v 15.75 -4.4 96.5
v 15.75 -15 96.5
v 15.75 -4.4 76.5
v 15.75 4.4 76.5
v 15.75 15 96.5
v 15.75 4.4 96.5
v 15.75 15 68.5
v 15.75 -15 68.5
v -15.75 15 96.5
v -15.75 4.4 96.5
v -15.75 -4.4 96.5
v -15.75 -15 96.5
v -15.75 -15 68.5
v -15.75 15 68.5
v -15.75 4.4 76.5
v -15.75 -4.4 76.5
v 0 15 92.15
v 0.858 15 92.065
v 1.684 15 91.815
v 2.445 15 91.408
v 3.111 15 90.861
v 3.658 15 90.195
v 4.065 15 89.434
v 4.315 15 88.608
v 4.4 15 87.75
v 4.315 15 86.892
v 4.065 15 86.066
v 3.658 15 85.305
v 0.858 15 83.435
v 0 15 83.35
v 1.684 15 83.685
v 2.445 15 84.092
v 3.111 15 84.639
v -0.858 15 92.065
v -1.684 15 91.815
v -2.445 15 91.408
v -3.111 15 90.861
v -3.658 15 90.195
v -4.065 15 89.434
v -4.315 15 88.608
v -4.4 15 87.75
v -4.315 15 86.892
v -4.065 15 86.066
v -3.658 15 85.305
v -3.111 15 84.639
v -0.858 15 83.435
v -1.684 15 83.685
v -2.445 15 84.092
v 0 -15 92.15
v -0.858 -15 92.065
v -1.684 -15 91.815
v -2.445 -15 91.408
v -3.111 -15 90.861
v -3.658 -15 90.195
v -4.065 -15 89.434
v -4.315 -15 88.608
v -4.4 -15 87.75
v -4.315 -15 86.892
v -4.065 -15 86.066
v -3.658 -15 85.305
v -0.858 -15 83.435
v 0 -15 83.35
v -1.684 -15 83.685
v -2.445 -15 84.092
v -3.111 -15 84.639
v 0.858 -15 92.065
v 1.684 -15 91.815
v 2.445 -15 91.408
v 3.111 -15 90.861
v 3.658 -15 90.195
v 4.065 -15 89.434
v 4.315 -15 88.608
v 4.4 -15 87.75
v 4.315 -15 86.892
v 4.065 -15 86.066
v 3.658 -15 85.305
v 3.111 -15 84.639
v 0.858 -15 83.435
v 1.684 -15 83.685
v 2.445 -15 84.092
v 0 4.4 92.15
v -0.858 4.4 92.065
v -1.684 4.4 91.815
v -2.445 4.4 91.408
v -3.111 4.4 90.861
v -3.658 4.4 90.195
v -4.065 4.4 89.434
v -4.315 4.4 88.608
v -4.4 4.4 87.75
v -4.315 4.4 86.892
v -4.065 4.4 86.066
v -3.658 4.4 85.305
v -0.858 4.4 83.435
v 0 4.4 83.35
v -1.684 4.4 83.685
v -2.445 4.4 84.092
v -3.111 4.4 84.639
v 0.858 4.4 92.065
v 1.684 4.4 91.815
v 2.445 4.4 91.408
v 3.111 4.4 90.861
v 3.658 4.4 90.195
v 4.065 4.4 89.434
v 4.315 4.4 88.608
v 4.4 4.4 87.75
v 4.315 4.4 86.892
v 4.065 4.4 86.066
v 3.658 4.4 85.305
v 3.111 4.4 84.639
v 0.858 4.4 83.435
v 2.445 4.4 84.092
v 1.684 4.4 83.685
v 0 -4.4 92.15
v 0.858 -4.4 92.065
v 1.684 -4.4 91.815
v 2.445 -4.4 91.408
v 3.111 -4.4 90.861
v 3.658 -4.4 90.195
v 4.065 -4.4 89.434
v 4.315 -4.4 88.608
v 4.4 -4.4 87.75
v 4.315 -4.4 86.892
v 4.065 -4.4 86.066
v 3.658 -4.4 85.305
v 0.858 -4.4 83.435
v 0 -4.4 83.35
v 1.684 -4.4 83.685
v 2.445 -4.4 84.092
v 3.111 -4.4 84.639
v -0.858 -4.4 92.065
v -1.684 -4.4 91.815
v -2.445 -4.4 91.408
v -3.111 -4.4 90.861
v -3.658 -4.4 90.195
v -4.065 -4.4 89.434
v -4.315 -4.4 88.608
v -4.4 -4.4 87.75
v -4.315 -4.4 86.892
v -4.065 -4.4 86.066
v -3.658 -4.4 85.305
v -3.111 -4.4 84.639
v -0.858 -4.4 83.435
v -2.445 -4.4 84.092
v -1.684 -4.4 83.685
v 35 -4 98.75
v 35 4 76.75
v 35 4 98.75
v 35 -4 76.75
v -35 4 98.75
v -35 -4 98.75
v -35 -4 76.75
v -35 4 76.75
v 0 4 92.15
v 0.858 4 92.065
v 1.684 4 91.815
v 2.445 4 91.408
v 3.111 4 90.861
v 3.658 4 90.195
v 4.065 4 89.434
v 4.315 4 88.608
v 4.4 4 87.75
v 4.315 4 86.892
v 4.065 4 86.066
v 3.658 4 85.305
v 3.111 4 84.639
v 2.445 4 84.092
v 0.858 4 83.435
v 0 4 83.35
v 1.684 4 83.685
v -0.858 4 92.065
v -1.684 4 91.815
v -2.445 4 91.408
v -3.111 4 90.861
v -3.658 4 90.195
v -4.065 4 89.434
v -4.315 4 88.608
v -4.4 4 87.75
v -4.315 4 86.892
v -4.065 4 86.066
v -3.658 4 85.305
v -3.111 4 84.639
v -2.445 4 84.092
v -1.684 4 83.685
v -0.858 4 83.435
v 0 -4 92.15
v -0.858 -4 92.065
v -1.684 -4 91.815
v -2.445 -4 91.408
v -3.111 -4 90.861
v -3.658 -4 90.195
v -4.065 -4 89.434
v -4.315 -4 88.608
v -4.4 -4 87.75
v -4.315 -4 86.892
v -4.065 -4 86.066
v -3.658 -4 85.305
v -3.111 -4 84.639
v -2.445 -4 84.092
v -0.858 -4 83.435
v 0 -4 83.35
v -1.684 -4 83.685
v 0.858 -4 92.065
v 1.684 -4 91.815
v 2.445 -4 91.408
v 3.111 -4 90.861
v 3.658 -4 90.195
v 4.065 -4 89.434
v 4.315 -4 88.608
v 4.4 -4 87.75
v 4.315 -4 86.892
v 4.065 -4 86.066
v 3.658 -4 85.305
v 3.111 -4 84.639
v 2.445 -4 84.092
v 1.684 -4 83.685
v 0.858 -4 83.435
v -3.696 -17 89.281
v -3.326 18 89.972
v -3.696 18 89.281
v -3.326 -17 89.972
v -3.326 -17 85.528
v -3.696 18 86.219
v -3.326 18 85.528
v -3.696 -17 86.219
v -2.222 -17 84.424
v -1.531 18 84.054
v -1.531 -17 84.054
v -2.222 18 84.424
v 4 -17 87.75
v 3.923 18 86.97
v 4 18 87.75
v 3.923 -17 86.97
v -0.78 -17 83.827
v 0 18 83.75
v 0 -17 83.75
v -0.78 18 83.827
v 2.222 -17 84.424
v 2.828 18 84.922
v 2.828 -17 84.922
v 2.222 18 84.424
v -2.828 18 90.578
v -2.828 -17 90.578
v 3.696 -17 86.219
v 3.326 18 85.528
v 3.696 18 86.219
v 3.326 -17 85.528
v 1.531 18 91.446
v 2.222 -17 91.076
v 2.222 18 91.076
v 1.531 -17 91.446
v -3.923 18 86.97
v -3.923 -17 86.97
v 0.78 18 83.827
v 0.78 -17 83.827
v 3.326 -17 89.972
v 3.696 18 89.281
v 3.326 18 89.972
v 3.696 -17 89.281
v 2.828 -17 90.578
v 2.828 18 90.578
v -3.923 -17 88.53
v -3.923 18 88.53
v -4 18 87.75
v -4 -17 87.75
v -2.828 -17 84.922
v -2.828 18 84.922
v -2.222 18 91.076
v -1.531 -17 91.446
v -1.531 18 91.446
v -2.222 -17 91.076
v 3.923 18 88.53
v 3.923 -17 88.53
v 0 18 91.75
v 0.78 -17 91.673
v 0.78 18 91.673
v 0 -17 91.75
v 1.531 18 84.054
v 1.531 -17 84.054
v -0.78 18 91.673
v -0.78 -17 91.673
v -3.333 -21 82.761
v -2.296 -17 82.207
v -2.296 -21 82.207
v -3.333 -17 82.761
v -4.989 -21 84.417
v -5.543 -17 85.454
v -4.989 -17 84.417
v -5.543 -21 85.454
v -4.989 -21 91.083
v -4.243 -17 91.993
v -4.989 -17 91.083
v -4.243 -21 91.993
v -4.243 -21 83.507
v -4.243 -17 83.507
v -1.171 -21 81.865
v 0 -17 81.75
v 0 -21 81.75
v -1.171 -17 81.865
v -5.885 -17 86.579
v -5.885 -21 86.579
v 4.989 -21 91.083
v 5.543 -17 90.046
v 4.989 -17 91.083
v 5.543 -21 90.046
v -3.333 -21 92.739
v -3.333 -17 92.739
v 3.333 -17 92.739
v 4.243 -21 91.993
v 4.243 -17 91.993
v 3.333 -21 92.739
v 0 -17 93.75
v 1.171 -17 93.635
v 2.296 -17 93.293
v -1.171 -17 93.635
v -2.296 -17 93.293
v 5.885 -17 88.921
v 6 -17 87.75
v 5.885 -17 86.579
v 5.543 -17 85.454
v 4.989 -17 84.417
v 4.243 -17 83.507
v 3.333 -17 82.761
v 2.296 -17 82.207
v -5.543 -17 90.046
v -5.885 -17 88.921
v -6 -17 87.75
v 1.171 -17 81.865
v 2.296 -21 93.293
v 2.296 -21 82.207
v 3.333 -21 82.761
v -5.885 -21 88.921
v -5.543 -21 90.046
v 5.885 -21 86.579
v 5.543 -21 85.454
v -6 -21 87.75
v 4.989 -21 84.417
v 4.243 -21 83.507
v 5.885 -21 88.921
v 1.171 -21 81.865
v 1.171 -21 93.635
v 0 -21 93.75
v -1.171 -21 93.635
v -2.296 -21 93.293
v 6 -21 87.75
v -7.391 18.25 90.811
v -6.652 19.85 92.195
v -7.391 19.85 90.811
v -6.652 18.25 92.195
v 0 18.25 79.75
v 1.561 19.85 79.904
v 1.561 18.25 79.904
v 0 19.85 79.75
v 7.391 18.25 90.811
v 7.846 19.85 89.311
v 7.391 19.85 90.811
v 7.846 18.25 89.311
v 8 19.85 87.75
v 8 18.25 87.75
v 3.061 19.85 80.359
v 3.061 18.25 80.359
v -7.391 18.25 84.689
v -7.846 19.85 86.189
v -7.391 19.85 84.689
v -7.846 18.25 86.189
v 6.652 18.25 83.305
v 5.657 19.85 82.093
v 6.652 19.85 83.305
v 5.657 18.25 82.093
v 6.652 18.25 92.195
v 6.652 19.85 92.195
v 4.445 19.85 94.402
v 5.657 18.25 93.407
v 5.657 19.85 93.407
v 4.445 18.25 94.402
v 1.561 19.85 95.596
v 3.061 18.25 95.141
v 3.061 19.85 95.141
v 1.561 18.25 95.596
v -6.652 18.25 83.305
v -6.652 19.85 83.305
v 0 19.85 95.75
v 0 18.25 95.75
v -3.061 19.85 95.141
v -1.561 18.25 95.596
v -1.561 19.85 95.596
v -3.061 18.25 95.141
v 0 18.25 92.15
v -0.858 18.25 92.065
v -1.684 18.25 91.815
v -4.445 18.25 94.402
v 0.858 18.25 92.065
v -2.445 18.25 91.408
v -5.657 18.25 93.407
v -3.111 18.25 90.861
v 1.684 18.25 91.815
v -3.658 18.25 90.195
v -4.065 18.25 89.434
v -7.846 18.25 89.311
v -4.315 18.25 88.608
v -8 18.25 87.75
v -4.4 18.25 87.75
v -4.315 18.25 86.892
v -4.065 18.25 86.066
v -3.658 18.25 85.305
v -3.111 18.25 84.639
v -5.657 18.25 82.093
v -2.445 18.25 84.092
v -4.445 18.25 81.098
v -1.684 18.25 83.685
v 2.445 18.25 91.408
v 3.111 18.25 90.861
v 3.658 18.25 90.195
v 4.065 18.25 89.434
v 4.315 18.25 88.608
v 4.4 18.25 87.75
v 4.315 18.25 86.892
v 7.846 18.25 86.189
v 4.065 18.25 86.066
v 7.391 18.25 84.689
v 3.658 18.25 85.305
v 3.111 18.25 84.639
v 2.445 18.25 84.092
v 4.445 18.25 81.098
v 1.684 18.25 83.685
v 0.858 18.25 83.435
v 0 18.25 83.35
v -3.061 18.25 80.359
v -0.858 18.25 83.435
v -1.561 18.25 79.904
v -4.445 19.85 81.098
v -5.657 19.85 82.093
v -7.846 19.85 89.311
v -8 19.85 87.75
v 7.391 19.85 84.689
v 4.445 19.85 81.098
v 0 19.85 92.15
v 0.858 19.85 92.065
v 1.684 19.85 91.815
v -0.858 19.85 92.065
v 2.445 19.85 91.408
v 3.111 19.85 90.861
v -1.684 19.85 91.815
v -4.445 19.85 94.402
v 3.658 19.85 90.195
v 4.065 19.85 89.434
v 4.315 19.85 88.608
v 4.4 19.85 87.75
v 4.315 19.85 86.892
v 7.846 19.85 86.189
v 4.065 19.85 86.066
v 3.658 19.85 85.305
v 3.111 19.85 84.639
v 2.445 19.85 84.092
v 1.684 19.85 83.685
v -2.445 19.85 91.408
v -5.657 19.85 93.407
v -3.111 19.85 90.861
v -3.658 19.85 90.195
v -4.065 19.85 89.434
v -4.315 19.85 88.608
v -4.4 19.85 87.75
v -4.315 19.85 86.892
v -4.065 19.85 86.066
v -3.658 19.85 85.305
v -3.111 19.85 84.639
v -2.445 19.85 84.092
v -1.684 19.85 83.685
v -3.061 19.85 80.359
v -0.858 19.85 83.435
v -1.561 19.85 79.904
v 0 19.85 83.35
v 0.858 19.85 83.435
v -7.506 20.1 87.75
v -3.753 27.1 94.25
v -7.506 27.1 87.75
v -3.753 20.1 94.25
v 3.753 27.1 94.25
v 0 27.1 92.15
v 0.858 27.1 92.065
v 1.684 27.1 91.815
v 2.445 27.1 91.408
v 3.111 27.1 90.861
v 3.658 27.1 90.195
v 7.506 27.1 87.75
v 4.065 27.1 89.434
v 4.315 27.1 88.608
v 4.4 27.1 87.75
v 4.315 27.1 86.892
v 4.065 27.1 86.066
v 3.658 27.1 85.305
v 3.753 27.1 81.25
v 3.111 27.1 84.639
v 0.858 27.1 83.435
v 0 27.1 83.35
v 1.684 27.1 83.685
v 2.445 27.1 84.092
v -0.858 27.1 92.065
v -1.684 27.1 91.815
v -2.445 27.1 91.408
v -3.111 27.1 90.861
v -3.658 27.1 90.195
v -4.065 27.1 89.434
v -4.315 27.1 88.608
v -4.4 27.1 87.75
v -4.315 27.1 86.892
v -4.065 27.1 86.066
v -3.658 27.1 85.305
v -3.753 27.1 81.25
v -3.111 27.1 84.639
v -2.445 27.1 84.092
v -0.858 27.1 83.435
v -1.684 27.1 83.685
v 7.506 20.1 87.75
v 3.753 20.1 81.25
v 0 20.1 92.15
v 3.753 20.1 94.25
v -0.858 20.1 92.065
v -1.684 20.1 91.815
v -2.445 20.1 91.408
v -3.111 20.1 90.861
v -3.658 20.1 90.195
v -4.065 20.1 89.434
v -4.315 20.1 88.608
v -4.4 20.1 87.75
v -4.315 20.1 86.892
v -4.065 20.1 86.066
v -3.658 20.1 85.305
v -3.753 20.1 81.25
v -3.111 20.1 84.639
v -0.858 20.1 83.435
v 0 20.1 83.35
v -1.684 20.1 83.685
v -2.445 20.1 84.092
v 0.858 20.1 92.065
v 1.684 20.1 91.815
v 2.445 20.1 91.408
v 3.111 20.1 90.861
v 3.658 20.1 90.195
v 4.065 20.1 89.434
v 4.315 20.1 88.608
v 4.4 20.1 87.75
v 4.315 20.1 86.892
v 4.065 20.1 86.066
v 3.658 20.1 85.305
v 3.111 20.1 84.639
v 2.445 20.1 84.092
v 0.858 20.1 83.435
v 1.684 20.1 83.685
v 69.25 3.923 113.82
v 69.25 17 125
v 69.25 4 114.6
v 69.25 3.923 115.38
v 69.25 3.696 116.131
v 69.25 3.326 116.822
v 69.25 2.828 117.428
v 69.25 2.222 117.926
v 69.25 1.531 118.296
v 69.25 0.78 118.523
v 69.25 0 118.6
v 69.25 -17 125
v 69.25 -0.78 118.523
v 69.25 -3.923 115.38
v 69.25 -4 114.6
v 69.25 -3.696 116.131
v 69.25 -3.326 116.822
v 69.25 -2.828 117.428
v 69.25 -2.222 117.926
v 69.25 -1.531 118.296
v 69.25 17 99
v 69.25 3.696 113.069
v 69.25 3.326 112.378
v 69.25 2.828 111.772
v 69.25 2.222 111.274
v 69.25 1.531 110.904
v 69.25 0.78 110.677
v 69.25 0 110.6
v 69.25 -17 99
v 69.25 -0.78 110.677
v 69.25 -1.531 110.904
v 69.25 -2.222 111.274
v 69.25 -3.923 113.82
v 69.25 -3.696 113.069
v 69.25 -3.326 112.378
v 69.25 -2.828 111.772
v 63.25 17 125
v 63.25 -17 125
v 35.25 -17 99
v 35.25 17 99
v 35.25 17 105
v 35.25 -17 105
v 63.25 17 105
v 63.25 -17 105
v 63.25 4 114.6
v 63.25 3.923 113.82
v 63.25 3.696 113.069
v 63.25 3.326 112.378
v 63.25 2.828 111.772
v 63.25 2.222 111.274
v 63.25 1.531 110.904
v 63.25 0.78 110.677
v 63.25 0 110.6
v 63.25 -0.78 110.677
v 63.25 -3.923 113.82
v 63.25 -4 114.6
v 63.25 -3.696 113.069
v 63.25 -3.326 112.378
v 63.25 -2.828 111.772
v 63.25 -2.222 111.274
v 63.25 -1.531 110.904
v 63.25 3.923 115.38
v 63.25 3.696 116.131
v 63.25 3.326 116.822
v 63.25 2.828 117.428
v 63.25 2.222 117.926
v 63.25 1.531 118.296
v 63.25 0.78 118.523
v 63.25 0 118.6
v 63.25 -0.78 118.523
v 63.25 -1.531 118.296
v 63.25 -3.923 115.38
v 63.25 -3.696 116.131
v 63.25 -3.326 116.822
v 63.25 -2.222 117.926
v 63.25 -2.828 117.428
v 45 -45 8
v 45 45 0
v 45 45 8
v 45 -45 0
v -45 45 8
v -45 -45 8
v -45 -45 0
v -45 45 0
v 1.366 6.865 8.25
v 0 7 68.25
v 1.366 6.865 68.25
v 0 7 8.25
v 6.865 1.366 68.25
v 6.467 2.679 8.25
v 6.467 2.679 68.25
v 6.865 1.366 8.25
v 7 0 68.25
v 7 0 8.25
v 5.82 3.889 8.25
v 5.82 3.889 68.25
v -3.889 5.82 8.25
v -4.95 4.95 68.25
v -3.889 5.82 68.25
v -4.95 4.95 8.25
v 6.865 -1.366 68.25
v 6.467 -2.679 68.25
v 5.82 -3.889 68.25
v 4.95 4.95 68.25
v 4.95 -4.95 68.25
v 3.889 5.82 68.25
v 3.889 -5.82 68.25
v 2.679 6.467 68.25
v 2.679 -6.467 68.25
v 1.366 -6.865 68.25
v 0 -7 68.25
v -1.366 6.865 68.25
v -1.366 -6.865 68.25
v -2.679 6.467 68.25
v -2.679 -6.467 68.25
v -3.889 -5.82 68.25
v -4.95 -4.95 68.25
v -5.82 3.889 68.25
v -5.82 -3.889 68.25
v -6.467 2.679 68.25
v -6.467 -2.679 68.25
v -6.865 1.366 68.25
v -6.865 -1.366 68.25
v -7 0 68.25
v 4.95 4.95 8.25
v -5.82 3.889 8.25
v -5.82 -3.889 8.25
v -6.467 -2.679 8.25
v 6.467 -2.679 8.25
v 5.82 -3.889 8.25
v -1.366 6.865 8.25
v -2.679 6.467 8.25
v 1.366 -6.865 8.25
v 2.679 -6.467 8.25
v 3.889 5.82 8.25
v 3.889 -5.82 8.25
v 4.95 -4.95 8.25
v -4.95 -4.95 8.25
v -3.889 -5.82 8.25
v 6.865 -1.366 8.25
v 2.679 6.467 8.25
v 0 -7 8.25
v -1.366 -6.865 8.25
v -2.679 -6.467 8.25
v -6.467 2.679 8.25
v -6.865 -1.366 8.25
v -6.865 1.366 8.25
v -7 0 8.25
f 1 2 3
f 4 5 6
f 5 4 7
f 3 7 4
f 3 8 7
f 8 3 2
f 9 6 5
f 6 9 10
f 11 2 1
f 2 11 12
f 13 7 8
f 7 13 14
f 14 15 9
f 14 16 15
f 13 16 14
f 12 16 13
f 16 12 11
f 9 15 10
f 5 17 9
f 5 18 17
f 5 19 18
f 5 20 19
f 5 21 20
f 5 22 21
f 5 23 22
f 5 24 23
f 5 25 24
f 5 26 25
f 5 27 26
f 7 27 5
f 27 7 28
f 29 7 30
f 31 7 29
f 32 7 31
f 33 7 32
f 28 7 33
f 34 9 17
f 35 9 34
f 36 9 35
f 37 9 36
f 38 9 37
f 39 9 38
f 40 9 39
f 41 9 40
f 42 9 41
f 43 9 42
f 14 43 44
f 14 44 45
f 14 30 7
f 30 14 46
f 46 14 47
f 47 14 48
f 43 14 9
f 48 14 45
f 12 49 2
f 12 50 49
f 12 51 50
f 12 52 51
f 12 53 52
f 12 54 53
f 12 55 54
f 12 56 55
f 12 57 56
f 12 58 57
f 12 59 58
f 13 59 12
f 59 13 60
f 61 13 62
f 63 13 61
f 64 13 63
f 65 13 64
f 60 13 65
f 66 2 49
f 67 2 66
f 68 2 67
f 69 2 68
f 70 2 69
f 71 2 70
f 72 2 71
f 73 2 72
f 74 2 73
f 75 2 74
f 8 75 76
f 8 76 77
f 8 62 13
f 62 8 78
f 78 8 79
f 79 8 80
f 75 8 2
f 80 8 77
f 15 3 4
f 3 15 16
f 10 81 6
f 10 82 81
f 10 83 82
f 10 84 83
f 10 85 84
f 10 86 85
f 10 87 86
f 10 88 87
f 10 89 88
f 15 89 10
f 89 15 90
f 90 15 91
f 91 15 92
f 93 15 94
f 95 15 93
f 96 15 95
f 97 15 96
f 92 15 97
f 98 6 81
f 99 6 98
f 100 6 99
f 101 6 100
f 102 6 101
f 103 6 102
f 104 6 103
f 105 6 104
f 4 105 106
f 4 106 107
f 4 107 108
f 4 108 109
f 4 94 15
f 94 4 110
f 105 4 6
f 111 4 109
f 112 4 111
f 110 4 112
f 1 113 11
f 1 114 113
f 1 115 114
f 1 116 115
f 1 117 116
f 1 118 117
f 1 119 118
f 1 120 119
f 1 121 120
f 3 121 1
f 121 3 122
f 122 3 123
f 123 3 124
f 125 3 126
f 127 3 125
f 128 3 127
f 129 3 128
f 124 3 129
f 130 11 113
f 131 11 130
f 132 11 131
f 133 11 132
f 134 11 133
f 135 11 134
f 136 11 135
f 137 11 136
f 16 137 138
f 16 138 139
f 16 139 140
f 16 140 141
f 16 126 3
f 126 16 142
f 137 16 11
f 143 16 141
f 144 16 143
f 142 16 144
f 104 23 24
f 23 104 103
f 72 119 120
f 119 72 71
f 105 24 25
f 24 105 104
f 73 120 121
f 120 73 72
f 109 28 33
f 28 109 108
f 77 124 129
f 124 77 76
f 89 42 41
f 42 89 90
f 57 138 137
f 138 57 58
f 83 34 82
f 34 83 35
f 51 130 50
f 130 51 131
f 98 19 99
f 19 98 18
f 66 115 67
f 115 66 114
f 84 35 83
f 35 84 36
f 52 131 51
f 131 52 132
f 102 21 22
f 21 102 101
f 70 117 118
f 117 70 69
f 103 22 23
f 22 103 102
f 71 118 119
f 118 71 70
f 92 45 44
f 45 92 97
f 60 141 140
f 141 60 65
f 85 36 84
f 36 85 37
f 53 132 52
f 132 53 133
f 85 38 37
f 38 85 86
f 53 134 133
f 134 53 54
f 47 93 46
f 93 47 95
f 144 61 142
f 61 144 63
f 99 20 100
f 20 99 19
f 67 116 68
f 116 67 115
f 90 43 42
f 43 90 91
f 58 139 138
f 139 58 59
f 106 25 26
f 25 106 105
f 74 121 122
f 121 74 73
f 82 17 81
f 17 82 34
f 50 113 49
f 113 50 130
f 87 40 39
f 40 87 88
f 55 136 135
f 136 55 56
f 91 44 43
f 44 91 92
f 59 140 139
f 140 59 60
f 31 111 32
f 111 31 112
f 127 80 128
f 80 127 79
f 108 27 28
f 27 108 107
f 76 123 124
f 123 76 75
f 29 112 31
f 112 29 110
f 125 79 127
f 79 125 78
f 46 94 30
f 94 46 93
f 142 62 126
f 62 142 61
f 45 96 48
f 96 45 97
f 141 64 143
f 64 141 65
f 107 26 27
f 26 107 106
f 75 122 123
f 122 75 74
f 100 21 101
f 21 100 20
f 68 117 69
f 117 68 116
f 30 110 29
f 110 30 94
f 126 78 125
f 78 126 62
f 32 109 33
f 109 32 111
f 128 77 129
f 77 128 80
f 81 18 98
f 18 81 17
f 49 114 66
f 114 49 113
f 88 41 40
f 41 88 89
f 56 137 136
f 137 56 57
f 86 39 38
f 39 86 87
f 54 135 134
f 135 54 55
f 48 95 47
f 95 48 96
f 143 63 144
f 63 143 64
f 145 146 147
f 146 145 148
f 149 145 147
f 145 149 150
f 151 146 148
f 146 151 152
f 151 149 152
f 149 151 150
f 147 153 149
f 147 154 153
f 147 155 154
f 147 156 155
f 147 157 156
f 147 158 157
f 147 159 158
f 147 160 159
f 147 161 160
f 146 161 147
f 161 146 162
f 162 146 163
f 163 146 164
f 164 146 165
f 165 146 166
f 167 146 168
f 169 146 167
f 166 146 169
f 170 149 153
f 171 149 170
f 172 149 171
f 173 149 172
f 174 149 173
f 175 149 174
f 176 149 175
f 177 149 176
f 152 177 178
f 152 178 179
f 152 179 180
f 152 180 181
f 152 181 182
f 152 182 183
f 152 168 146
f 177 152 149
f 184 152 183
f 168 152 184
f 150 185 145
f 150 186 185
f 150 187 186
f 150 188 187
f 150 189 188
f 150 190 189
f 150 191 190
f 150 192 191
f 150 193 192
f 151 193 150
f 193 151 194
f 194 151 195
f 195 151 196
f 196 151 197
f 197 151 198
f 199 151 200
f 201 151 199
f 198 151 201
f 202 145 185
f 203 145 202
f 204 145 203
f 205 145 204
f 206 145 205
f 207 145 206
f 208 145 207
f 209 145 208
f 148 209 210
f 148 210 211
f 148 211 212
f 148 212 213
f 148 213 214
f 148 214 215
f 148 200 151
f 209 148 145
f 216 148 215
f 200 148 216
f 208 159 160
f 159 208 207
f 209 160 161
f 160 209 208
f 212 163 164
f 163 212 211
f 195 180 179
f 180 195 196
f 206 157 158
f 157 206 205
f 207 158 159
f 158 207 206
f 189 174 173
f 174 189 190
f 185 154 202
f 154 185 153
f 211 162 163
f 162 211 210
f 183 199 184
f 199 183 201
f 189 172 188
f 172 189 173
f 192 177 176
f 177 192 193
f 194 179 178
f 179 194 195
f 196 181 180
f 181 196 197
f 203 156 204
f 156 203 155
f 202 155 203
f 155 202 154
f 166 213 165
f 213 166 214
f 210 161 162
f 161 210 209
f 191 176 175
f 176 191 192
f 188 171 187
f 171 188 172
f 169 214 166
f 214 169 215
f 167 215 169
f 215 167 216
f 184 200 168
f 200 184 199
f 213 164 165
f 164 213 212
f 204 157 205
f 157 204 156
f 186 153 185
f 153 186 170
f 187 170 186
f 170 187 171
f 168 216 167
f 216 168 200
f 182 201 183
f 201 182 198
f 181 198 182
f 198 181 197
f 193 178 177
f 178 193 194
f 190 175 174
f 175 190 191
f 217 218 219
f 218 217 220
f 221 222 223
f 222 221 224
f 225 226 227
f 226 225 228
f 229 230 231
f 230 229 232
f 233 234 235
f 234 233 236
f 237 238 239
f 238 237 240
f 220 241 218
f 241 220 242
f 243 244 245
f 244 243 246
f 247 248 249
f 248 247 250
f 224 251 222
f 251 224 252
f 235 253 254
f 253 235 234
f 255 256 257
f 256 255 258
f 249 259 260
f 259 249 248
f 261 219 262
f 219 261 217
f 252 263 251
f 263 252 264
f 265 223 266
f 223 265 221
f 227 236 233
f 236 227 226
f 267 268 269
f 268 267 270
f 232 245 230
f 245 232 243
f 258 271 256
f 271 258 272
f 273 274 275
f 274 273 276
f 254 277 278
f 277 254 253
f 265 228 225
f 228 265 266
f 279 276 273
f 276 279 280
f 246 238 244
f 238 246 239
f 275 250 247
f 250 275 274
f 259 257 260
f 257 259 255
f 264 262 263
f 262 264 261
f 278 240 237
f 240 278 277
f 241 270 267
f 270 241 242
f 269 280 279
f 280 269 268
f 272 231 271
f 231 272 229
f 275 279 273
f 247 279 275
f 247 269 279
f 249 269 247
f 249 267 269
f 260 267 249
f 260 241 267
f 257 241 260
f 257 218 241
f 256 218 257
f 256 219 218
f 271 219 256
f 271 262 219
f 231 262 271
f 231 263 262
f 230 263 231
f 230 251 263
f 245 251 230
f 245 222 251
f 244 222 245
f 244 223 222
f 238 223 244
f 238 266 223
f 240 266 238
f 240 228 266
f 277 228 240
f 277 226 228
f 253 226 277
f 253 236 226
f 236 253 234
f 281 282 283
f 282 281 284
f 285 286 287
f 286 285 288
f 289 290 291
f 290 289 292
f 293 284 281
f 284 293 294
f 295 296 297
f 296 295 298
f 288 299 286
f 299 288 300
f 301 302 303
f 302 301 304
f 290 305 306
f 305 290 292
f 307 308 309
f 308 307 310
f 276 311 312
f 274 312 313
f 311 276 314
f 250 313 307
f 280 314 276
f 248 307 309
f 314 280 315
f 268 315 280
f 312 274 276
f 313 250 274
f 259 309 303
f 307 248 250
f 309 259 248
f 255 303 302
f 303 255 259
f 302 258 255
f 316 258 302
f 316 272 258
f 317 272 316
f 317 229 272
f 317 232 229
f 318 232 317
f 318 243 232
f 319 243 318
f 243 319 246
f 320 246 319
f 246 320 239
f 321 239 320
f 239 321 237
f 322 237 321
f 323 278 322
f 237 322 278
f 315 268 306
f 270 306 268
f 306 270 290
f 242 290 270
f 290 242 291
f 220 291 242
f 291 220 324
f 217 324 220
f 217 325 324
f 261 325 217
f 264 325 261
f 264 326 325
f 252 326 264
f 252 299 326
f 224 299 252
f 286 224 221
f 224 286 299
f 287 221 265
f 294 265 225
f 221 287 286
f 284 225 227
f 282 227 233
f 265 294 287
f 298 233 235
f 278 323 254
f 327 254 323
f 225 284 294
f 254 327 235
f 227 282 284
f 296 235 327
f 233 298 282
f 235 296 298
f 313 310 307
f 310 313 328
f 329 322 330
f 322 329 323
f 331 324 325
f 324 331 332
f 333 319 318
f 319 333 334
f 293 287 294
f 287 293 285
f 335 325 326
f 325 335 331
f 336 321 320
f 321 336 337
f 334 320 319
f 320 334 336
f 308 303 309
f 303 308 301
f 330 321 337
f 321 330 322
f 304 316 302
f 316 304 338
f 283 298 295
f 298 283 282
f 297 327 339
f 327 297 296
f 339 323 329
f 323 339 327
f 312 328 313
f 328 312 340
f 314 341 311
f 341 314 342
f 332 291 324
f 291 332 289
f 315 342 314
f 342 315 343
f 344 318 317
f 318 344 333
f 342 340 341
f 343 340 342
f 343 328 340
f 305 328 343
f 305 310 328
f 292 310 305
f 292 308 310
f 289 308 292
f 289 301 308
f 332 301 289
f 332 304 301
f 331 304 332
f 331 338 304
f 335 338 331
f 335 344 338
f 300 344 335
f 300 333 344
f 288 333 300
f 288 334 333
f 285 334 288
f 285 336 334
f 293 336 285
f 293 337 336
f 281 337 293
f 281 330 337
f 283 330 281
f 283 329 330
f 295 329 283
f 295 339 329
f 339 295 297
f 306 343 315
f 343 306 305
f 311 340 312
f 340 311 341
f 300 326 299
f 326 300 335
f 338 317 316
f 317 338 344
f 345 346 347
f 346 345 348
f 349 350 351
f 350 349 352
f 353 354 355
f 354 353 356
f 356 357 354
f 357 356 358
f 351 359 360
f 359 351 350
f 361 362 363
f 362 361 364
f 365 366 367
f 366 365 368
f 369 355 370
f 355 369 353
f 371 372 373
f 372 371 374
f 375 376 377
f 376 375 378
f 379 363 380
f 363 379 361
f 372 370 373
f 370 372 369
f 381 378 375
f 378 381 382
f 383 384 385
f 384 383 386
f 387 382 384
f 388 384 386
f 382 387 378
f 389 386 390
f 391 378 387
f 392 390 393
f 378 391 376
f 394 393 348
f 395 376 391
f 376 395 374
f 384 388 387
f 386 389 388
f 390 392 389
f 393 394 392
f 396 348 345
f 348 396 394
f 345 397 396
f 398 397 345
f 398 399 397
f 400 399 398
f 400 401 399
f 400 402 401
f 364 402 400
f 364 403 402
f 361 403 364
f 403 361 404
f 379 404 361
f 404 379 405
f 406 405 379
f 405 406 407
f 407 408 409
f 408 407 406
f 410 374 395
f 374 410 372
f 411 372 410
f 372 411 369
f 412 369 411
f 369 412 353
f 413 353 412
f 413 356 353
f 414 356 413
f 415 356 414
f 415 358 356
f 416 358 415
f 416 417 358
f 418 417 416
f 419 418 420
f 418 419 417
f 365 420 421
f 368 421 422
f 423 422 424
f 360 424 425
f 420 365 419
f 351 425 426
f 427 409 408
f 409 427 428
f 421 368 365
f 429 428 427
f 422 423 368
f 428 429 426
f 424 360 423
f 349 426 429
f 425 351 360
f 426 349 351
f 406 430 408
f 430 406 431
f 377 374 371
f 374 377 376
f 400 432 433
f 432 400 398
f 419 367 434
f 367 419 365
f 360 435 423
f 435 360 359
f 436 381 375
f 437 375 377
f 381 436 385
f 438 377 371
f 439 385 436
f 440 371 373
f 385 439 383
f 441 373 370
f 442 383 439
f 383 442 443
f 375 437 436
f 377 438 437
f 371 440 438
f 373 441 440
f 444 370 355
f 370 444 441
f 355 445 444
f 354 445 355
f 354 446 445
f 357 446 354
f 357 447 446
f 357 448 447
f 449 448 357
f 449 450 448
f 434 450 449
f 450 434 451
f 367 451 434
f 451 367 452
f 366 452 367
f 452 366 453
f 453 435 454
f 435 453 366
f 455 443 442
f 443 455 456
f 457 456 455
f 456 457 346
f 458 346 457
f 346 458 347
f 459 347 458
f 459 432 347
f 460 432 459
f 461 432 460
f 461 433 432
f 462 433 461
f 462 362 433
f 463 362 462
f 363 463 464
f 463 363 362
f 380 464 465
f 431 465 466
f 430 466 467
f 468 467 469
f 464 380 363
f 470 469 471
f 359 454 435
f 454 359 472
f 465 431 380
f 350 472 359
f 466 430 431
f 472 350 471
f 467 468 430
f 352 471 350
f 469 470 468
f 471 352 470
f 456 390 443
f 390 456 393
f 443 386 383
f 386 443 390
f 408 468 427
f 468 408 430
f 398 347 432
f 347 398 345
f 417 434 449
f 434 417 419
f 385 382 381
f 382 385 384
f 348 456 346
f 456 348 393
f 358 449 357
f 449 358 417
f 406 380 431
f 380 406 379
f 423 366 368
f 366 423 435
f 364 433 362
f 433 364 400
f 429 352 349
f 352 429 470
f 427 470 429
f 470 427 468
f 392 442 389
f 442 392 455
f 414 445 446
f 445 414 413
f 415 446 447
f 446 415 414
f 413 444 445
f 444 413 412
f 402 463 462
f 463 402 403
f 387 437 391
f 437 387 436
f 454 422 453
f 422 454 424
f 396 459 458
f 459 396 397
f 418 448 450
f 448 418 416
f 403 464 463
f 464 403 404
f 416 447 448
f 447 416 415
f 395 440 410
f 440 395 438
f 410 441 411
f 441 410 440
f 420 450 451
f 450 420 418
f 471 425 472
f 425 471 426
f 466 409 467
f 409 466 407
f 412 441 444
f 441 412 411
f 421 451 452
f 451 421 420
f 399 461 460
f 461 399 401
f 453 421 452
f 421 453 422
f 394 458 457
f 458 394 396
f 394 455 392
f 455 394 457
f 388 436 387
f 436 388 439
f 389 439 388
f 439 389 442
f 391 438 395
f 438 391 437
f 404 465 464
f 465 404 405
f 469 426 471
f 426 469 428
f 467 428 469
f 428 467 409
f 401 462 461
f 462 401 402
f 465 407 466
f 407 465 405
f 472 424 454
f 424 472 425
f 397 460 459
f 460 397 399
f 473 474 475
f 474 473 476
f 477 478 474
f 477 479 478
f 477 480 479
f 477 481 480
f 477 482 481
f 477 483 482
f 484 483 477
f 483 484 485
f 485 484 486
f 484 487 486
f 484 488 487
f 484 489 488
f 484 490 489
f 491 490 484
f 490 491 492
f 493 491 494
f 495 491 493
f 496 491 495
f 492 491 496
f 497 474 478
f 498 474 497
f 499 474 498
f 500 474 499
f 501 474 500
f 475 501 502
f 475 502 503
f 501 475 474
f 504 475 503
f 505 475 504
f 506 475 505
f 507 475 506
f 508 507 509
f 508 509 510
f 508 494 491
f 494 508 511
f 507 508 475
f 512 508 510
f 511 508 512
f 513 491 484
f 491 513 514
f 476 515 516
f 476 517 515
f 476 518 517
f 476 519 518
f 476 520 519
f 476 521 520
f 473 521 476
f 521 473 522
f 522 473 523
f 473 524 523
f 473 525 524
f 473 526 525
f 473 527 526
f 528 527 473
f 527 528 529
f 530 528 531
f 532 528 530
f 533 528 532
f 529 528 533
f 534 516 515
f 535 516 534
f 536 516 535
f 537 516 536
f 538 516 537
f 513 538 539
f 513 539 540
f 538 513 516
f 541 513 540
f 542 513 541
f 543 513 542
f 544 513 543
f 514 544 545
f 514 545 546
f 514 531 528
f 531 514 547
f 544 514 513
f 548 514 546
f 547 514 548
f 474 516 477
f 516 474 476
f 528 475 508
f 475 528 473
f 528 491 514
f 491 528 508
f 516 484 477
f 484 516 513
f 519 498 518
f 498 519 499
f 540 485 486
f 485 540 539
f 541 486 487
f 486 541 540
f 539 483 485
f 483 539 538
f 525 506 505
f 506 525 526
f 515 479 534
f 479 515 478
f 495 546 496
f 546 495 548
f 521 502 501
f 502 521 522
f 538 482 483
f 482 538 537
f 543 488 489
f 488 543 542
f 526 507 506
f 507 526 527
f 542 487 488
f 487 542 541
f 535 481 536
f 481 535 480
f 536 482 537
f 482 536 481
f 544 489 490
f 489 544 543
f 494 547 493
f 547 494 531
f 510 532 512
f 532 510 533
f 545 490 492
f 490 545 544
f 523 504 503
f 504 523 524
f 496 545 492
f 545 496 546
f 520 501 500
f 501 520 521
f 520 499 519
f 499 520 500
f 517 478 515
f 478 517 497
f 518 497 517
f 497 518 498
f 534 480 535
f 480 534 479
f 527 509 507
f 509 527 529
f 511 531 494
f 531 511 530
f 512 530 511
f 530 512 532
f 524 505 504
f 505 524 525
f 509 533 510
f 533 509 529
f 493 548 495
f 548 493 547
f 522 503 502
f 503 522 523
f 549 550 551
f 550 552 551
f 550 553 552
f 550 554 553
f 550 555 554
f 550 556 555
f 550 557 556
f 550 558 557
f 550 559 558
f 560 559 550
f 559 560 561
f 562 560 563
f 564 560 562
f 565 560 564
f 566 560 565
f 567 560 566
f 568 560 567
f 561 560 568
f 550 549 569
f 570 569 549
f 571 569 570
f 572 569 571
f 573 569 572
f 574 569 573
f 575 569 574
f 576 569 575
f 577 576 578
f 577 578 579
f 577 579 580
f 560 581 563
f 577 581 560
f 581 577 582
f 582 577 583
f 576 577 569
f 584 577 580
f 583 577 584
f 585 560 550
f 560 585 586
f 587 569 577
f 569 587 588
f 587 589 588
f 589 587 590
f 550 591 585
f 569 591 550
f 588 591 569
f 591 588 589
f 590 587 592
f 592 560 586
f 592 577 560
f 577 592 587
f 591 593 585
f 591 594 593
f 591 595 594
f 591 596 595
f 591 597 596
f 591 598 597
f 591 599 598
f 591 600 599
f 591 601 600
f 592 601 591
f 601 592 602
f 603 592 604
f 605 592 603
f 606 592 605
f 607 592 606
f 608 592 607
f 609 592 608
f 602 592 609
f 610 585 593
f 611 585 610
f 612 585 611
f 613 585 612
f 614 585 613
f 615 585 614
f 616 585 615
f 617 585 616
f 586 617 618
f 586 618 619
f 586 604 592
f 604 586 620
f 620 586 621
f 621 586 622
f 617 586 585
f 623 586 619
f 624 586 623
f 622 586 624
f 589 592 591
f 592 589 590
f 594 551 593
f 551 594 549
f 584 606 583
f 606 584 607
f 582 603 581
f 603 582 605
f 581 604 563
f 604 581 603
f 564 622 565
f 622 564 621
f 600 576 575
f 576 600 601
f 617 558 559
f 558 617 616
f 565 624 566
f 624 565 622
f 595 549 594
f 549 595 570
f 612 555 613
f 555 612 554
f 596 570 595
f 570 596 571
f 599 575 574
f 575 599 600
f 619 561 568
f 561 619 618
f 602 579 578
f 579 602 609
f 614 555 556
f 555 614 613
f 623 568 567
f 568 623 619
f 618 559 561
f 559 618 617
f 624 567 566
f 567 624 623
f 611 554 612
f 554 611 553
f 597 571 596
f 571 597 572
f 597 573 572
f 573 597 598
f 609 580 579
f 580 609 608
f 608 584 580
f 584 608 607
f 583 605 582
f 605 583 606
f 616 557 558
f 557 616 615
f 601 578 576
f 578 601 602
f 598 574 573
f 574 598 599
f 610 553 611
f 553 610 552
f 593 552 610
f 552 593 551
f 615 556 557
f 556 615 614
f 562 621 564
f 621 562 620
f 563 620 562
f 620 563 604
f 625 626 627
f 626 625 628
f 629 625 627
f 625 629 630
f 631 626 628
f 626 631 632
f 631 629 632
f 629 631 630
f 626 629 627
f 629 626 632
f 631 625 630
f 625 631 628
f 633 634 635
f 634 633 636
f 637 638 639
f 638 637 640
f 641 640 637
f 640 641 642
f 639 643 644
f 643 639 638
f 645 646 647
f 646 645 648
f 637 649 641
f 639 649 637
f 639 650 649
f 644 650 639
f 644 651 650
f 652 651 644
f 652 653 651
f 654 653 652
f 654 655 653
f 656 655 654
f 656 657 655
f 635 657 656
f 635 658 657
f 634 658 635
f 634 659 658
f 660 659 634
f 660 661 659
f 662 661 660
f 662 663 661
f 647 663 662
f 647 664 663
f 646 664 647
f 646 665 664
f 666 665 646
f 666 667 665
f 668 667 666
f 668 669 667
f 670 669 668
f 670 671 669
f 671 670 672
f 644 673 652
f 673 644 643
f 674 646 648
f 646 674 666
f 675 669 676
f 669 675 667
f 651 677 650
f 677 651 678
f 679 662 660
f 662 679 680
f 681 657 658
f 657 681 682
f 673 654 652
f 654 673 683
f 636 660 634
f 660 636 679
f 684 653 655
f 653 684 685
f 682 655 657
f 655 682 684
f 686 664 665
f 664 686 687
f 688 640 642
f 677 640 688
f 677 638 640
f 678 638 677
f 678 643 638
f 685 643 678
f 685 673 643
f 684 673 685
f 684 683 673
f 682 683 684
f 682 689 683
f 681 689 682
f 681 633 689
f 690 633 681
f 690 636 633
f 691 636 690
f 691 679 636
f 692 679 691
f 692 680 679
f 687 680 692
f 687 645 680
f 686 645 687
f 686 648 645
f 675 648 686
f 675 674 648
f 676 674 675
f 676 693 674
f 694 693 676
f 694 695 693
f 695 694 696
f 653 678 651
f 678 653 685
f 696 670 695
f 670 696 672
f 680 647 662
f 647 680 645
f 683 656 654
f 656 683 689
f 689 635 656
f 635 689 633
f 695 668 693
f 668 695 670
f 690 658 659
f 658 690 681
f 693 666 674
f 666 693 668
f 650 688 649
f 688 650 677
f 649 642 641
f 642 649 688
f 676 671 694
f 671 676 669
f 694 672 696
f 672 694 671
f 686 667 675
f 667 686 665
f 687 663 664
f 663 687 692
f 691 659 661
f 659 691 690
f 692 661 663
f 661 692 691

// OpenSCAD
$fn = 32;

// ------------------------------------------------------------------------
// Lamp arm: column d14 x 60 mm, arm 70 mm
// Every part is its own module, assembly() places every instance.
// ------------------------------------------------------------------------

// --- part 1 ---
module lamp_base() {
  difference() {
    translate([-45, -45, 0]) cube([90, 90, 8]);
  }
}

// --- part 2 ---
module lamp_column() {
  cylinder(h = 60, d = 14);
}

// --- part 3 ---
module head_fork() {
  difference() {
    translate([-15.75, -15, 0]) cube([31.5, 30, 28]);
    translate([-16.75, -4.4, 8]) cube([33.5, 8.8, 21]);
    translate([0, 0, 19.25]) rotate([90, 0, 0]) cylinder(h = 32, d = 8.8, center = true);
  }
}

// --- part 4 ---
module lamp_arm() {
  difference() {
    translate([-35, -4, 0]) cube([70, 8, 22]);
    translate([0, 0, 11]) rotate([90, 0, 0]) cylinder(h = 10, d = 8.8, center = true);
  }
}

// --- part 5 ---
module arm_pin() {
  rotate([0, 90, 0]) cylinder(h = 36, d = 8, center = true);
  translate([-21, 0, 0]) rotate([0, 90, 0]) cylinder(h = 4, d = 12);
}

// --- part 6 ---
module arm_washer() {
  difference() {
      translate([0, 0, 0]) cylinder(h = 1.6, d = 16);
      translate([0, 0, -1]) cylinder(h = 3.6, d = 8.8);
    }
}

// --- part 7 ---
module arm_nut() {
  difference() {
    linear_extrude(height = 7) polygon(points = [[7.506, 0], [3.753, 6.5], [-3.753, 6.5], [-7.506, 0], [-3.753, -6.5], [3.753, -6.5]]);
    translate([0, 0, -1]) cylinder(h = 9, d = 8.8);
  }
}

// --- part 8 ---
module shade_bracket() {
  difference() {
    translate([-17, -17, 0]) cube([34, 34, 26]);
    translate([-18, -18, 6]) cube([29, 36, 21]);
    translate([14, 0, 15.6]) rotate([0, 90, 0]) cylinder(h = 8, d = 8, center = true);
  }
}

// --- assembly ---
module assembly() {
  color([0.80, 0.24, 0.20]) translate([0, 0, 0]) rotate([0, 0, 0]) lamp_base();
  color([0.20, 0.45, 0.75]) translate([0, 0, 8.25]) rotate([0, 0, 0]) lamp_column();
  color([0.25, 0.62, 0.32]) translate([0, 0, 68.5]) rotate([0, 0, 0]) head_fork();
  color([0.92, 0.70, 0.18]) translate([0, 0, 76.75]) rotate([0, 0, 0]) lamp_arm();
  color([0.58, 0.35, 0.70]) translate([0, 0, 87.75]) rotate([0, 0, 90]) arm_pin();
  color([0.16, 0.66, 0.66]) translate([0, 19.85, 87.75]) rotate([90, 0, 0]) arm_washer();
  color([0.85, 0.48, 0.18]) translate([0, 27.1, 87.75]) rotate([90, 0, 0]) arm_nut();
  color([0.55, 0.60, 0.65]) translate([52.25, 0, 99]) rotate([0, 0, 0]) shade_bracket();
}

assembly();
